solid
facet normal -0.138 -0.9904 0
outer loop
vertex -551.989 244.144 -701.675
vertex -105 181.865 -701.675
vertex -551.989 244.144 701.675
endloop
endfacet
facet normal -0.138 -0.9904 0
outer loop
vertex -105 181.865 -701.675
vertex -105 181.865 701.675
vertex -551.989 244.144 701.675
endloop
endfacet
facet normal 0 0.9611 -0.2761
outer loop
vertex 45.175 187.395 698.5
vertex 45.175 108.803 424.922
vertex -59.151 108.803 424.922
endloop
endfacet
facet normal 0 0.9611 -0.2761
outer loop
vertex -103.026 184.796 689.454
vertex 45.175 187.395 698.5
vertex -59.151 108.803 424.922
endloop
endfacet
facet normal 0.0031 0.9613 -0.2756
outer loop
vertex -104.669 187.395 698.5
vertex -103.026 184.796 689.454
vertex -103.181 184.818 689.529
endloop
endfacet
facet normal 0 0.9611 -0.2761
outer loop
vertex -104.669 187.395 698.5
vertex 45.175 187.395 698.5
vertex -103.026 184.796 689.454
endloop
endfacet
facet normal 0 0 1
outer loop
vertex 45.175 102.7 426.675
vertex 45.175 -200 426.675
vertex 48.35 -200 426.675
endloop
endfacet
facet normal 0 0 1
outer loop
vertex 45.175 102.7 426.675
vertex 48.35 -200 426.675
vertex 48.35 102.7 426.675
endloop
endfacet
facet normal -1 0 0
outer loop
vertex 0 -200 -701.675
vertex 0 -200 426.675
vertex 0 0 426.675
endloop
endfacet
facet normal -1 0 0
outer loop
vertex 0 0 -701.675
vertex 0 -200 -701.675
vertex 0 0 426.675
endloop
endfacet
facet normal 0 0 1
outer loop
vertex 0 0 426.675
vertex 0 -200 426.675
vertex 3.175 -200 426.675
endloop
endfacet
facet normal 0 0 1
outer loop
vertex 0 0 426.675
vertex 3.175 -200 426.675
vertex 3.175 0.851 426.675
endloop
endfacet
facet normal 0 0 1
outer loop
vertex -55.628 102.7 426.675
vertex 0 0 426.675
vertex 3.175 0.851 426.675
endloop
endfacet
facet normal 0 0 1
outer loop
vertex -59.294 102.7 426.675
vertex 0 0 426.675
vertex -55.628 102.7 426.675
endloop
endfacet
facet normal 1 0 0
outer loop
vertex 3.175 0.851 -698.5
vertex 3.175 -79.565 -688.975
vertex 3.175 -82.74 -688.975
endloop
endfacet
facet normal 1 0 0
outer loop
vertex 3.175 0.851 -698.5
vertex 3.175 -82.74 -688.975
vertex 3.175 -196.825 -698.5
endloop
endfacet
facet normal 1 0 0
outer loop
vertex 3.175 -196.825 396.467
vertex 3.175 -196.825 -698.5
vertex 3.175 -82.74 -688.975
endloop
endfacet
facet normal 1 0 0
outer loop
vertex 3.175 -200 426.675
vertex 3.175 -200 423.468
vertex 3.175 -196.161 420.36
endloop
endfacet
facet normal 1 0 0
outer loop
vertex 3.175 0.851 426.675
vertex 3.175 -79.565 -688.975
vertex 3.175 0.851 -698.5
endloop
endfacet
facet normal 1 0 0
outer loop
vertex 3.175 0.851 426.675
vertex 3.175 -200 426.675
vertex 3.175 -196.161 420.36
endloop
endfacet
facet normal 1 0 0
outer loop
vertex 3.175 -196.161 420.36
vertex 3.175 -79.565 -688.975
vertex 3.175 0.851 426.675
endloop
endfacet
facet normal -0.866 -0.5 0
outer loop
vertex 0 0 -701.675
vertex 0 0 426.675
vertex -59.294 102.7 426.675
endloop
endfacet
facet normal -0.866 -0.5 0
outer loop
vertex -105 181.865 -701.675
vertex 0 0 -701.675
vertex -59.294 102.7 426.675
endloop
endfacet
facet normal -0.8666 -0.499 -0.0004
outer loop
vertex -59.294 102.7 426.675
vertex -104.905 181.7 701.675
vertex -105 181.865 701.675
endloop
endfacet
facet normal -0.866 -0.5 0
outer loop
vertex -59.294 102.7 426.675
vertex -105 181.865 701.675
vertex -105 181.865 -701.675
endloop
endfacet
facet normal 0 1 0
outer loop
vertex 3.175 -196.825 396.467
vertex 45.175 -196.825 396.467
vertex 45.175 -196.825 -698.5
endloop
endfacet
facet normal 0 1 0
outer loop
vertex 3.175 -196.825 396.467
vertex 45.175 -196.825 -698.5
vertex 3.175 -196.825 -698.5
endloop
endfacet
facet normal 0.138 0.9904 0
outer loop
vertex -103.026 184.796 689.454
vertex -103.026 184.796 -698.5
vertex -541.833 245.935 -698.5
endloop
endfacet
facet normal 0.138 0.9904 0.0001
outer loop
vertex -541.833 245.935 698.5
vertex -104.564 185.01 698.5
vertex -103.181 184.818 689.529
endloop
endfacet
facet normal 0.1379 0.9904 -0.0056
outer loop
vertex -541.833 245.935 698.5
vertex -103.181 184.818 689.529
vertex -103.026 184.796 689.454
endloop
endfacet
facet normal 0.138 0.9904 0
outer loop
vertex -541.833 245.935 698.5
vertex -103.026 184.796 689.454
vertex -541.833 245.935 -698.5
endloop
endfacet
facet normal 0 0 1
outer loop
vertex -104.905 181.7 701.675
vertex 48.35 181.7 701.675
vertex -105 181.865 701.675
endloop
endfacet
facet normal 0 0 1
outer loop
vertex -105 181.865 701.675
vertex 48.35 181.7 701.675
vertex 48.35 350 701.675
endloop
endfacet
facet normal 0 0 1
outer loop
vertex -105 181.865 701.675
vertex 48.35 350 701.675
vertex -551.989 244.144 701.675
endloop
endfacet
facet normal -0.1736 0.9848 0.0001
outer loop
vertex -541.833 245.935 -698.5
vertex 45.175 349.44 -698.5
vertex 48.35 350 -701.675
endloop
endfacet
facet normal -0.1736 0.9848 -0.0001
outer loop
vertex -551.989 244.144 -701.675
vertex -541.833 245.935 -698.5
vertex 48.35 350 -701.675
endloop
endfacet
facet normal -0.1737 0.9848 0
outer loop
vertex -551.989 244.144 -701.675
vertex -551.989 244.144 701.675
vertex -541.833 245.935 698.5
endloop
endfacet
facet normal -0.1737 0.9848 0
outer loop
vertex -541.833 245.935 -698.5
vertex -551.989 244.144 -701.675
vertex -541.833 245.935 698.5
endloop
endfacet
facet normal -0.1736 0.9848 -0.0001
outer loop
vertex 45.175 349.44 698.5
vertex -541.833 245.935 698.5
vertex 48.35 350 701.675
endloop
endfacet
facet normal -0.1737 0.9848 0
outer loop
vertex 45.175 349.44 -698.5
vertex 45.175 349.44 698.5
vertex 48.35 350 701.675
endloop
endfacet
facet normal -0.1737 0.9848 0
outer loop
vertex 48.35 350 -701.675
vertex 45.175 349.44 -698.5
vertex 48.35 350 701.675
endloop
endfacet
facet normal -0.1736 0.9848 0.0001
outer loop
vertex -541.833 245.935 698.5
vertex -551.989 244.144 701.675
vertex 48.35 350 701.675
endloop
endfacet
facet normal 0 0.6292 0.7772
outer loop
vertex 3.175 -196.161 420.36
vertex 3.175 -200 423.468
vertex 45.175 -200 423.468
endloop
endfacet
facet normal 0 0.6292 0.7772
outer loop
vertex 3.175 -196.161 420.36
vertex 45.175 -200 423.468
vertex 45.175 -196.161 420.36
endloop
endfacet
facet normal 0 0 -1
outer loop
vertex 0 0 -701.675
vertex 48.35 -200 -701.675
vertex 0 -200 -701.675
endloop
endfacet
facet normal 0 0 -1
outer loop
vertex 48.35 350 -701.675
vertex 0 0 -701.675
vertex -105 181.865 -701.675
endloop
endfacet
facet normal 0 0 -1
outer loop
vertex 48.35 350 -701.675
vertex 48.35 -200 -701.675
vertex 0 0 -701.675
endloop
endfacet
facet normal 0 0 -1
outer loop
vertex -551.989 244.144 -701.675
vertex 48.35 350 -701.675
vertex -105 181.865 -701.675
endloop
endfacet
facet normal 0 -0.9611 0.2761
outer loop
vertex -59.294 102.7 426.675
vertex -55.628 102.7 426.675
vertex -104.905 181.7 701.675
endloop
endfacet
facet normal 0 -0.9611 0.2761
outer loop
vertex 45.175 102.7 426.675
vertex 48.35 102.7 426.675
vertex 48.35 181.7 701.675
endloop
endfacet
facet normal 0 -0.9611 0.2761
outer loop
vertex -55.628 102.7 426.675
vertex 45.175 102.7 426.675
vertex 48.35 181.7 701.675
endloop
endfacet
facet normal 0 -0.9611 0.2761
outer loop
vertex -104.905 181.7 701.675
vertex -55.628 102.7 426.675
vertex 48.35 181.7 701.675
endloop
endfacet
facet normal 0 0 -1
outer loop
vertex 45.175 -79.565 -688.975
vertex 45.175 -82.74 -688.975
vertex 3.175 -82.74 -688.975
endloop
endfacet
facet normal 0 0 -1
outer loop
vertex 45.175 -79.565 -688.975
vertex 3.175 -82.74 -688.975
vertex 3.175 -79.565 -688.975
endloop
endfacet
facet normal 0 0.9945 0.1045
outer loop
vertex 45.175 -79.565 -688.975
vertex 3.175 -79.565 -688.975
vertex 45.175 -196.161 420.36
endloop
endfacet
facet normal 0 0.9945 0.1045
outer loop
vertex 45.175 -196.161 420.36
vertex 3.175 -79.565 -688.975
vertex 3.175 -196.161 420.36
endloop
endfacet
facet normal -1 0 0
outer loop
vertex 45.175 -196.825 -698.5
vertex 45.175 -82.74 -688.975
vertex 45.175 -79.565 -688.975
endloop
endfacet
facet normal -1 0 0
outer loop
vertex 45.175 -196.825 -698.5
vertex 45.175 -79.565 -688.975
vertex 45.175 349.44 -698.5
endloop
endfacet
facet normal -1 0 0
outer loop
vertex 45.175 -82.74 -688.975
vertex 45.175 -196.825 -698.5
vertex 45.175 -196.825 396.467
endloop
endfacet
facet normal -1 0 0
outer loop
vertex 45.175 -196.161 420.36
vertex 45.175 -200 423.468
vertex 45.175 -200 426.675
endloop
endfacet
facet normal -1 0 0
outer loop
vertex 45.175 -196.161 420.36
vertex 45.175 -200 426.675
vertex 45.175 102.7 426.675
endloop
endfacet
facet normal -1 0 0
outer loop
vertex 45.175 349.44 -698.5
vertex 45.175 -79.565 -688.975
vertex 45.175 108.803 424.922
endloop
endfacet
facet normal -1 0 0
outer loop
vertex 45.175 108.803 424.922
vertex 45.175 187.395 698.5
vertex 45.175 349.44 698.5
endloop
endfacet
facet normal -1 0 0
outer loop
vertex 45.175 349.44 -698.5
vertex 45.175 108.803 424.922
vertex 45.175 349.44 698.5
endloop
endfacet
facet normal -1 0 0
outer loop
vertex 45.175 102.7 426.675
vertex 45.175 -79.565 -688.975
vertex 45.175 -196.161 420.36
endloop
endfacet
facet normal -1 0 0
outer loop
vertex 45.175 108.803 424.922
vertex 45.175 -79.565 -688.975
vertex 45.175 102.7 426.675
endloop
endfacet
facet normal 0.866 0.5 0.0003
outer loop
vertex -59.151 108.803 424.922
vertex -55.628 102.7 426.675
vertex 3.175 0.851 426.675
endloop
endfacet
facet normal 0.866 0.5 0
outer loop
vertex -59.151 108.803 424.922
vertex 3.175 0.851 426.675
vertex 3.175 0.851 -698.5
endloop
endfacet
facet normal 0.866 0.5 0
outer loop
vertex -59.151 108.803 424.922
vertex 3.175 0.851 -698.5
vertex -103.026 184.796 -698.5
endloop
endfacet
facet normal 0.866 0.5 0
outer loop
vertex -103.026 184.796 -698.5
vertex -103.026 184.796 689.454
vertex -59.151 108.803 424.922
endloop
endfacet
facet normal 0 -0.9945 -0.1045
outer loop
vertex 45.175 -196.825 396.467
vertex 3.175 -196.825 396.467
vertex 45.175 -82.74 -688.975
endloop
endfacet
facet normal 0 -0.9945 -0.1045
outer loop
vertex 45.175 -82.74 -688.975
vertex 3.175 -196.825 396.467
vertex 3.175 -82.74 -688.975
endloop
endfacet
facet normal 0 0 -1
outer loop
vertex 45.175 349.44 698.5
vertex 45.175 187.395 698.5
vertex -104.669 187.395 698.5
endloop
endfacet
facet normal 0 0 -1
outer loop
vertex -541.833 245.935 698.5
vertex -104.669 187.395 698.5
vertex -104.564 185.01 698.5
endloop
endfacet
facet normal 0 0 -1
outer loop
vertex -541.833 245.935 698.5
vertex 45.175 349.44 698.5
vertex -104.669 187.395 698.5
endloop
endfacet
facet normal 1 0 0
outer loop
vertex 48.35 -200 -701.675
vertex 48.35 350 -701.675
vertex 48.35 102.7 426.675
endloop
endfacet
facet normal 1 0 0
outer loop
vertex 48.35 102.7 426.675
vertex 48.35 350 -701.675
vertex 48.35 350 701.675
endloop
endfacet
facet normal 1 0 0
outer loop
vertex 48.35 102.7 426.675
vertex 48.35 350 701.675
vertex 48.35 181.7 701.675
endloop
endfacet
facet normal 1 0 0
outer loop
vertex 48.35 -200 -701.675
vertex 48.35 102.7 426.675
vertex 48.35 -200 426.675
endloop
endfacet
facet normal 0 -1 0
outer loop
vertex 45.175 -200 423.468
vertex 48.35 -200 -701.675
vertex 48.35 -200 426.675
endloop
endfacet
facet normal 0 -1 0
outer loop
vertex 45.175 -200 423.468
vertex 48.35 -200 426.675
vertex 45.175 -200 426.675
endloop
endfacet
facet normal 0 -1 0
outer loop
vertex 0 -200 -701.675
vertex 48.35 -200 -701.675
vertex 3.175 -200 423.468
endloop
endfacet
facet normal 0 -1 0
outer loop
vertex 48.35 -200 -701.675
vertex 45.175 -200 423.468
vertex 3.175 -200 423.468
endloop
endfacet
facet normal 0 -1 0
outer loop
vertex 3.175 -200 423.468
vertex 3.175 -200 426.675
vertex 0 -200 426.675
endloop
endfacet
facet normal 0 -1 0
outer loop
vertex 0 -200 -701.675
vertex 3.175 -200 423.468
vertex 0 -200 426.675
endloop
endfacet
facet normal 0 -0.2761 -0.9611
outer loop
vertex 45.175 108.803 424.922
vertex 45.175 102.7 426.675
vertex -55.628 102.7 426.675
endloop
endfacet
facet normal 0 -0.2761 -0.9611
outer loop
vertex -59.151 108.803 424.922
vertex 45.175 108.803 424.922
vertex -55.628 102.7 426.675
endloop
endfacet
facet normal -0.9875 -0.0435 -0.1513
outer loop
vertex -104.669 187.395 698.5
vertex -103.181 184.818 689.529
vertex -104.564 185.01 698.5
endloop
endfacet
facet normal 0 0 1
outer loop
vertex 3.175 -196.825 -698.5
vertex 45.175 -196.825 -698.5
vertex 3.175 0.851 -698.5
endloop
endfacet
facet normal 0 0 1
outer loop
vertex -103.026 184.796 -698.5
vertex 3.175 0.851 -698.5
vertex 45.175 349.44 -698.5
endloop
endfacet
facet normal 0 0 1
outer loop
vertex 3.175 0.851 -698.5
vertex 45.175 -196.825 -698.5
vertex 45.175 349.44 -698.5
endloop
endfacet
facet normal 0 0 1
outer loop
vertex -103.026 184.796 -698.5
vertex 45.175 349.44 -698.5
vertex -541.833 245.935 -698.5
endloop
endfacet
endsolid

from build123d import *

# Parameters (mm, degrees)
BOSS_EXTRUDE1_DEPTH = 701.675
SHELL1_T            = -3.175
SKETCH3_W           = 42
SKETCH3_H           = 290
CUT_EXTRUDE1_DEPTH  = 20
SKETCH7_W           = 275
SKETCH7_H           = 302.7
CUT_EXTRUDE5_DEPTH  = 100
CUT_EXTRUDE7_DEPTH  = 988.549739455
BOSS_EXTRUDE3_DEPTH = 6.35
BOSS_EXTRUDE4_DEPTH = 42
CHAMFER1_SIZE       = 7.134884114
CHAMFER1_SIZE_2     = 6.35


with BuildPart() as part:
    # Sketch2 → Boss-Extrude1 (new, symmetric)
    with BuildSketch(Plane.XY):
        Polygon((0, 0), (-105, 181.865334795), (-551.988806236, 244.144070894), (48.35, 350), (48.35, -200), (0, -200), align=None)
    extrude(amount=BOSS_EXTRUDE1_DEPTH, both=True)

    # Shell1
    shell1_openings = [part.faces().sort_by_distance(p)[0] for p in [
        (-251.819403118, 297.072035447, 0),
    ]]
    offset(amount=SHELL1_T, openings=shell1_openings, kind=Kind.INTERSECTION)

    # Sketch3 → Cut-Extrude1 (cut)
    with BuildSketch(Plane.XY.offset(701.675)):
        with Locations((24.175, -42.3)):
            Rectangle(SKETCH3_W, SKETCH3_H)
    extrude(amount=-CUT_EXTRUDE1_DEPTH, mode=Mode.SUBTRACT)

    # Sketch7 → Cut-Extrude5 (cut, symmetric)
    with BuildSketch(Plane.ZY):
        with Locations((564.175, -48.65)):
            Rectangle(SKETCH7_W, SKETCH7_H)
    extrude(amount=CUT_EXTRUDE5_DEPTH, both=True, mode=Mode.SUBTRACT)

    # Sketch9 → Cut-Extrude7 (cut, through all)
    with BuildSketch(Plane(origin=(48.35, 0, 0), x_dir=(0, 0, -1), z_dir=(1, 0, 0))):
        Polygon((-701.675, 102.7), (-426.675, 102.7), (-701.675, 181.7), align=None)
    extrude(amount=-CUT_EXTRUDE7_DEPTH, mode=Mode.SUBTRACT)

    # Sketch11 → Boss-Extrude3 (add)
    with BuildSketch(Plane(origin=(0, -18.35715529, 5.273510065), x_dir=(1, 0, 0), z_dir=(0, -0.9611272890955623, 0.27610565759472516))):
        Polygon((48.35, 724.567388561), (48.35, 438.44503711), (-59.293872646, 438.44503711), (-104.904543912, 724.567388561), align=None)
    extrude(amount=-BOSS_EXTRUDE3_DEPTH)

    # Sketch12 → Boss-Extrude4 (add)
    with BuildSketch(Plane(origin=(3.175, 0, 0), x_dir=(0, 0, -1), z_dir=(1, 0, 0))):
        Polygon((688.975, -79.565459926), (-396.466892858, -193.65), (-396.466892858, -196.825), (688.975, -82.740459926), align=None)
        Polygon((-396.466892858, -193.65), (-426.675, -196.825), (-396.466892858, -196.825), align=None)
    extrude(amount=BOSS_EXTRUDE4_DEPTH)

    # Chamfer1
    # the kernel refuses this chamfer: 7.134884114, 6.35 mm, written as the material it takes off along each edge
    with BuildSketch(Plane(origin=(3.175, -196.825, 426.675), x_dir=(0, -0.9997021141585574, 0.02440661686737172), z_dir=(1, 0, 0))) as chamfer1_piece_1:
        Polygon((CHAMFER1_SIZE * 0.999702114118, CHAMFER1_SIZE * 0.0244066168664), (-CHAMFER1_SIZE_2 * 0.128770240585, CHAMFER1_SIZE_2 * 0.991674455222), (0, 0), align=None)
    extrude(amount=42, mode=Mode.SUBTRACT)


solid = part.part
